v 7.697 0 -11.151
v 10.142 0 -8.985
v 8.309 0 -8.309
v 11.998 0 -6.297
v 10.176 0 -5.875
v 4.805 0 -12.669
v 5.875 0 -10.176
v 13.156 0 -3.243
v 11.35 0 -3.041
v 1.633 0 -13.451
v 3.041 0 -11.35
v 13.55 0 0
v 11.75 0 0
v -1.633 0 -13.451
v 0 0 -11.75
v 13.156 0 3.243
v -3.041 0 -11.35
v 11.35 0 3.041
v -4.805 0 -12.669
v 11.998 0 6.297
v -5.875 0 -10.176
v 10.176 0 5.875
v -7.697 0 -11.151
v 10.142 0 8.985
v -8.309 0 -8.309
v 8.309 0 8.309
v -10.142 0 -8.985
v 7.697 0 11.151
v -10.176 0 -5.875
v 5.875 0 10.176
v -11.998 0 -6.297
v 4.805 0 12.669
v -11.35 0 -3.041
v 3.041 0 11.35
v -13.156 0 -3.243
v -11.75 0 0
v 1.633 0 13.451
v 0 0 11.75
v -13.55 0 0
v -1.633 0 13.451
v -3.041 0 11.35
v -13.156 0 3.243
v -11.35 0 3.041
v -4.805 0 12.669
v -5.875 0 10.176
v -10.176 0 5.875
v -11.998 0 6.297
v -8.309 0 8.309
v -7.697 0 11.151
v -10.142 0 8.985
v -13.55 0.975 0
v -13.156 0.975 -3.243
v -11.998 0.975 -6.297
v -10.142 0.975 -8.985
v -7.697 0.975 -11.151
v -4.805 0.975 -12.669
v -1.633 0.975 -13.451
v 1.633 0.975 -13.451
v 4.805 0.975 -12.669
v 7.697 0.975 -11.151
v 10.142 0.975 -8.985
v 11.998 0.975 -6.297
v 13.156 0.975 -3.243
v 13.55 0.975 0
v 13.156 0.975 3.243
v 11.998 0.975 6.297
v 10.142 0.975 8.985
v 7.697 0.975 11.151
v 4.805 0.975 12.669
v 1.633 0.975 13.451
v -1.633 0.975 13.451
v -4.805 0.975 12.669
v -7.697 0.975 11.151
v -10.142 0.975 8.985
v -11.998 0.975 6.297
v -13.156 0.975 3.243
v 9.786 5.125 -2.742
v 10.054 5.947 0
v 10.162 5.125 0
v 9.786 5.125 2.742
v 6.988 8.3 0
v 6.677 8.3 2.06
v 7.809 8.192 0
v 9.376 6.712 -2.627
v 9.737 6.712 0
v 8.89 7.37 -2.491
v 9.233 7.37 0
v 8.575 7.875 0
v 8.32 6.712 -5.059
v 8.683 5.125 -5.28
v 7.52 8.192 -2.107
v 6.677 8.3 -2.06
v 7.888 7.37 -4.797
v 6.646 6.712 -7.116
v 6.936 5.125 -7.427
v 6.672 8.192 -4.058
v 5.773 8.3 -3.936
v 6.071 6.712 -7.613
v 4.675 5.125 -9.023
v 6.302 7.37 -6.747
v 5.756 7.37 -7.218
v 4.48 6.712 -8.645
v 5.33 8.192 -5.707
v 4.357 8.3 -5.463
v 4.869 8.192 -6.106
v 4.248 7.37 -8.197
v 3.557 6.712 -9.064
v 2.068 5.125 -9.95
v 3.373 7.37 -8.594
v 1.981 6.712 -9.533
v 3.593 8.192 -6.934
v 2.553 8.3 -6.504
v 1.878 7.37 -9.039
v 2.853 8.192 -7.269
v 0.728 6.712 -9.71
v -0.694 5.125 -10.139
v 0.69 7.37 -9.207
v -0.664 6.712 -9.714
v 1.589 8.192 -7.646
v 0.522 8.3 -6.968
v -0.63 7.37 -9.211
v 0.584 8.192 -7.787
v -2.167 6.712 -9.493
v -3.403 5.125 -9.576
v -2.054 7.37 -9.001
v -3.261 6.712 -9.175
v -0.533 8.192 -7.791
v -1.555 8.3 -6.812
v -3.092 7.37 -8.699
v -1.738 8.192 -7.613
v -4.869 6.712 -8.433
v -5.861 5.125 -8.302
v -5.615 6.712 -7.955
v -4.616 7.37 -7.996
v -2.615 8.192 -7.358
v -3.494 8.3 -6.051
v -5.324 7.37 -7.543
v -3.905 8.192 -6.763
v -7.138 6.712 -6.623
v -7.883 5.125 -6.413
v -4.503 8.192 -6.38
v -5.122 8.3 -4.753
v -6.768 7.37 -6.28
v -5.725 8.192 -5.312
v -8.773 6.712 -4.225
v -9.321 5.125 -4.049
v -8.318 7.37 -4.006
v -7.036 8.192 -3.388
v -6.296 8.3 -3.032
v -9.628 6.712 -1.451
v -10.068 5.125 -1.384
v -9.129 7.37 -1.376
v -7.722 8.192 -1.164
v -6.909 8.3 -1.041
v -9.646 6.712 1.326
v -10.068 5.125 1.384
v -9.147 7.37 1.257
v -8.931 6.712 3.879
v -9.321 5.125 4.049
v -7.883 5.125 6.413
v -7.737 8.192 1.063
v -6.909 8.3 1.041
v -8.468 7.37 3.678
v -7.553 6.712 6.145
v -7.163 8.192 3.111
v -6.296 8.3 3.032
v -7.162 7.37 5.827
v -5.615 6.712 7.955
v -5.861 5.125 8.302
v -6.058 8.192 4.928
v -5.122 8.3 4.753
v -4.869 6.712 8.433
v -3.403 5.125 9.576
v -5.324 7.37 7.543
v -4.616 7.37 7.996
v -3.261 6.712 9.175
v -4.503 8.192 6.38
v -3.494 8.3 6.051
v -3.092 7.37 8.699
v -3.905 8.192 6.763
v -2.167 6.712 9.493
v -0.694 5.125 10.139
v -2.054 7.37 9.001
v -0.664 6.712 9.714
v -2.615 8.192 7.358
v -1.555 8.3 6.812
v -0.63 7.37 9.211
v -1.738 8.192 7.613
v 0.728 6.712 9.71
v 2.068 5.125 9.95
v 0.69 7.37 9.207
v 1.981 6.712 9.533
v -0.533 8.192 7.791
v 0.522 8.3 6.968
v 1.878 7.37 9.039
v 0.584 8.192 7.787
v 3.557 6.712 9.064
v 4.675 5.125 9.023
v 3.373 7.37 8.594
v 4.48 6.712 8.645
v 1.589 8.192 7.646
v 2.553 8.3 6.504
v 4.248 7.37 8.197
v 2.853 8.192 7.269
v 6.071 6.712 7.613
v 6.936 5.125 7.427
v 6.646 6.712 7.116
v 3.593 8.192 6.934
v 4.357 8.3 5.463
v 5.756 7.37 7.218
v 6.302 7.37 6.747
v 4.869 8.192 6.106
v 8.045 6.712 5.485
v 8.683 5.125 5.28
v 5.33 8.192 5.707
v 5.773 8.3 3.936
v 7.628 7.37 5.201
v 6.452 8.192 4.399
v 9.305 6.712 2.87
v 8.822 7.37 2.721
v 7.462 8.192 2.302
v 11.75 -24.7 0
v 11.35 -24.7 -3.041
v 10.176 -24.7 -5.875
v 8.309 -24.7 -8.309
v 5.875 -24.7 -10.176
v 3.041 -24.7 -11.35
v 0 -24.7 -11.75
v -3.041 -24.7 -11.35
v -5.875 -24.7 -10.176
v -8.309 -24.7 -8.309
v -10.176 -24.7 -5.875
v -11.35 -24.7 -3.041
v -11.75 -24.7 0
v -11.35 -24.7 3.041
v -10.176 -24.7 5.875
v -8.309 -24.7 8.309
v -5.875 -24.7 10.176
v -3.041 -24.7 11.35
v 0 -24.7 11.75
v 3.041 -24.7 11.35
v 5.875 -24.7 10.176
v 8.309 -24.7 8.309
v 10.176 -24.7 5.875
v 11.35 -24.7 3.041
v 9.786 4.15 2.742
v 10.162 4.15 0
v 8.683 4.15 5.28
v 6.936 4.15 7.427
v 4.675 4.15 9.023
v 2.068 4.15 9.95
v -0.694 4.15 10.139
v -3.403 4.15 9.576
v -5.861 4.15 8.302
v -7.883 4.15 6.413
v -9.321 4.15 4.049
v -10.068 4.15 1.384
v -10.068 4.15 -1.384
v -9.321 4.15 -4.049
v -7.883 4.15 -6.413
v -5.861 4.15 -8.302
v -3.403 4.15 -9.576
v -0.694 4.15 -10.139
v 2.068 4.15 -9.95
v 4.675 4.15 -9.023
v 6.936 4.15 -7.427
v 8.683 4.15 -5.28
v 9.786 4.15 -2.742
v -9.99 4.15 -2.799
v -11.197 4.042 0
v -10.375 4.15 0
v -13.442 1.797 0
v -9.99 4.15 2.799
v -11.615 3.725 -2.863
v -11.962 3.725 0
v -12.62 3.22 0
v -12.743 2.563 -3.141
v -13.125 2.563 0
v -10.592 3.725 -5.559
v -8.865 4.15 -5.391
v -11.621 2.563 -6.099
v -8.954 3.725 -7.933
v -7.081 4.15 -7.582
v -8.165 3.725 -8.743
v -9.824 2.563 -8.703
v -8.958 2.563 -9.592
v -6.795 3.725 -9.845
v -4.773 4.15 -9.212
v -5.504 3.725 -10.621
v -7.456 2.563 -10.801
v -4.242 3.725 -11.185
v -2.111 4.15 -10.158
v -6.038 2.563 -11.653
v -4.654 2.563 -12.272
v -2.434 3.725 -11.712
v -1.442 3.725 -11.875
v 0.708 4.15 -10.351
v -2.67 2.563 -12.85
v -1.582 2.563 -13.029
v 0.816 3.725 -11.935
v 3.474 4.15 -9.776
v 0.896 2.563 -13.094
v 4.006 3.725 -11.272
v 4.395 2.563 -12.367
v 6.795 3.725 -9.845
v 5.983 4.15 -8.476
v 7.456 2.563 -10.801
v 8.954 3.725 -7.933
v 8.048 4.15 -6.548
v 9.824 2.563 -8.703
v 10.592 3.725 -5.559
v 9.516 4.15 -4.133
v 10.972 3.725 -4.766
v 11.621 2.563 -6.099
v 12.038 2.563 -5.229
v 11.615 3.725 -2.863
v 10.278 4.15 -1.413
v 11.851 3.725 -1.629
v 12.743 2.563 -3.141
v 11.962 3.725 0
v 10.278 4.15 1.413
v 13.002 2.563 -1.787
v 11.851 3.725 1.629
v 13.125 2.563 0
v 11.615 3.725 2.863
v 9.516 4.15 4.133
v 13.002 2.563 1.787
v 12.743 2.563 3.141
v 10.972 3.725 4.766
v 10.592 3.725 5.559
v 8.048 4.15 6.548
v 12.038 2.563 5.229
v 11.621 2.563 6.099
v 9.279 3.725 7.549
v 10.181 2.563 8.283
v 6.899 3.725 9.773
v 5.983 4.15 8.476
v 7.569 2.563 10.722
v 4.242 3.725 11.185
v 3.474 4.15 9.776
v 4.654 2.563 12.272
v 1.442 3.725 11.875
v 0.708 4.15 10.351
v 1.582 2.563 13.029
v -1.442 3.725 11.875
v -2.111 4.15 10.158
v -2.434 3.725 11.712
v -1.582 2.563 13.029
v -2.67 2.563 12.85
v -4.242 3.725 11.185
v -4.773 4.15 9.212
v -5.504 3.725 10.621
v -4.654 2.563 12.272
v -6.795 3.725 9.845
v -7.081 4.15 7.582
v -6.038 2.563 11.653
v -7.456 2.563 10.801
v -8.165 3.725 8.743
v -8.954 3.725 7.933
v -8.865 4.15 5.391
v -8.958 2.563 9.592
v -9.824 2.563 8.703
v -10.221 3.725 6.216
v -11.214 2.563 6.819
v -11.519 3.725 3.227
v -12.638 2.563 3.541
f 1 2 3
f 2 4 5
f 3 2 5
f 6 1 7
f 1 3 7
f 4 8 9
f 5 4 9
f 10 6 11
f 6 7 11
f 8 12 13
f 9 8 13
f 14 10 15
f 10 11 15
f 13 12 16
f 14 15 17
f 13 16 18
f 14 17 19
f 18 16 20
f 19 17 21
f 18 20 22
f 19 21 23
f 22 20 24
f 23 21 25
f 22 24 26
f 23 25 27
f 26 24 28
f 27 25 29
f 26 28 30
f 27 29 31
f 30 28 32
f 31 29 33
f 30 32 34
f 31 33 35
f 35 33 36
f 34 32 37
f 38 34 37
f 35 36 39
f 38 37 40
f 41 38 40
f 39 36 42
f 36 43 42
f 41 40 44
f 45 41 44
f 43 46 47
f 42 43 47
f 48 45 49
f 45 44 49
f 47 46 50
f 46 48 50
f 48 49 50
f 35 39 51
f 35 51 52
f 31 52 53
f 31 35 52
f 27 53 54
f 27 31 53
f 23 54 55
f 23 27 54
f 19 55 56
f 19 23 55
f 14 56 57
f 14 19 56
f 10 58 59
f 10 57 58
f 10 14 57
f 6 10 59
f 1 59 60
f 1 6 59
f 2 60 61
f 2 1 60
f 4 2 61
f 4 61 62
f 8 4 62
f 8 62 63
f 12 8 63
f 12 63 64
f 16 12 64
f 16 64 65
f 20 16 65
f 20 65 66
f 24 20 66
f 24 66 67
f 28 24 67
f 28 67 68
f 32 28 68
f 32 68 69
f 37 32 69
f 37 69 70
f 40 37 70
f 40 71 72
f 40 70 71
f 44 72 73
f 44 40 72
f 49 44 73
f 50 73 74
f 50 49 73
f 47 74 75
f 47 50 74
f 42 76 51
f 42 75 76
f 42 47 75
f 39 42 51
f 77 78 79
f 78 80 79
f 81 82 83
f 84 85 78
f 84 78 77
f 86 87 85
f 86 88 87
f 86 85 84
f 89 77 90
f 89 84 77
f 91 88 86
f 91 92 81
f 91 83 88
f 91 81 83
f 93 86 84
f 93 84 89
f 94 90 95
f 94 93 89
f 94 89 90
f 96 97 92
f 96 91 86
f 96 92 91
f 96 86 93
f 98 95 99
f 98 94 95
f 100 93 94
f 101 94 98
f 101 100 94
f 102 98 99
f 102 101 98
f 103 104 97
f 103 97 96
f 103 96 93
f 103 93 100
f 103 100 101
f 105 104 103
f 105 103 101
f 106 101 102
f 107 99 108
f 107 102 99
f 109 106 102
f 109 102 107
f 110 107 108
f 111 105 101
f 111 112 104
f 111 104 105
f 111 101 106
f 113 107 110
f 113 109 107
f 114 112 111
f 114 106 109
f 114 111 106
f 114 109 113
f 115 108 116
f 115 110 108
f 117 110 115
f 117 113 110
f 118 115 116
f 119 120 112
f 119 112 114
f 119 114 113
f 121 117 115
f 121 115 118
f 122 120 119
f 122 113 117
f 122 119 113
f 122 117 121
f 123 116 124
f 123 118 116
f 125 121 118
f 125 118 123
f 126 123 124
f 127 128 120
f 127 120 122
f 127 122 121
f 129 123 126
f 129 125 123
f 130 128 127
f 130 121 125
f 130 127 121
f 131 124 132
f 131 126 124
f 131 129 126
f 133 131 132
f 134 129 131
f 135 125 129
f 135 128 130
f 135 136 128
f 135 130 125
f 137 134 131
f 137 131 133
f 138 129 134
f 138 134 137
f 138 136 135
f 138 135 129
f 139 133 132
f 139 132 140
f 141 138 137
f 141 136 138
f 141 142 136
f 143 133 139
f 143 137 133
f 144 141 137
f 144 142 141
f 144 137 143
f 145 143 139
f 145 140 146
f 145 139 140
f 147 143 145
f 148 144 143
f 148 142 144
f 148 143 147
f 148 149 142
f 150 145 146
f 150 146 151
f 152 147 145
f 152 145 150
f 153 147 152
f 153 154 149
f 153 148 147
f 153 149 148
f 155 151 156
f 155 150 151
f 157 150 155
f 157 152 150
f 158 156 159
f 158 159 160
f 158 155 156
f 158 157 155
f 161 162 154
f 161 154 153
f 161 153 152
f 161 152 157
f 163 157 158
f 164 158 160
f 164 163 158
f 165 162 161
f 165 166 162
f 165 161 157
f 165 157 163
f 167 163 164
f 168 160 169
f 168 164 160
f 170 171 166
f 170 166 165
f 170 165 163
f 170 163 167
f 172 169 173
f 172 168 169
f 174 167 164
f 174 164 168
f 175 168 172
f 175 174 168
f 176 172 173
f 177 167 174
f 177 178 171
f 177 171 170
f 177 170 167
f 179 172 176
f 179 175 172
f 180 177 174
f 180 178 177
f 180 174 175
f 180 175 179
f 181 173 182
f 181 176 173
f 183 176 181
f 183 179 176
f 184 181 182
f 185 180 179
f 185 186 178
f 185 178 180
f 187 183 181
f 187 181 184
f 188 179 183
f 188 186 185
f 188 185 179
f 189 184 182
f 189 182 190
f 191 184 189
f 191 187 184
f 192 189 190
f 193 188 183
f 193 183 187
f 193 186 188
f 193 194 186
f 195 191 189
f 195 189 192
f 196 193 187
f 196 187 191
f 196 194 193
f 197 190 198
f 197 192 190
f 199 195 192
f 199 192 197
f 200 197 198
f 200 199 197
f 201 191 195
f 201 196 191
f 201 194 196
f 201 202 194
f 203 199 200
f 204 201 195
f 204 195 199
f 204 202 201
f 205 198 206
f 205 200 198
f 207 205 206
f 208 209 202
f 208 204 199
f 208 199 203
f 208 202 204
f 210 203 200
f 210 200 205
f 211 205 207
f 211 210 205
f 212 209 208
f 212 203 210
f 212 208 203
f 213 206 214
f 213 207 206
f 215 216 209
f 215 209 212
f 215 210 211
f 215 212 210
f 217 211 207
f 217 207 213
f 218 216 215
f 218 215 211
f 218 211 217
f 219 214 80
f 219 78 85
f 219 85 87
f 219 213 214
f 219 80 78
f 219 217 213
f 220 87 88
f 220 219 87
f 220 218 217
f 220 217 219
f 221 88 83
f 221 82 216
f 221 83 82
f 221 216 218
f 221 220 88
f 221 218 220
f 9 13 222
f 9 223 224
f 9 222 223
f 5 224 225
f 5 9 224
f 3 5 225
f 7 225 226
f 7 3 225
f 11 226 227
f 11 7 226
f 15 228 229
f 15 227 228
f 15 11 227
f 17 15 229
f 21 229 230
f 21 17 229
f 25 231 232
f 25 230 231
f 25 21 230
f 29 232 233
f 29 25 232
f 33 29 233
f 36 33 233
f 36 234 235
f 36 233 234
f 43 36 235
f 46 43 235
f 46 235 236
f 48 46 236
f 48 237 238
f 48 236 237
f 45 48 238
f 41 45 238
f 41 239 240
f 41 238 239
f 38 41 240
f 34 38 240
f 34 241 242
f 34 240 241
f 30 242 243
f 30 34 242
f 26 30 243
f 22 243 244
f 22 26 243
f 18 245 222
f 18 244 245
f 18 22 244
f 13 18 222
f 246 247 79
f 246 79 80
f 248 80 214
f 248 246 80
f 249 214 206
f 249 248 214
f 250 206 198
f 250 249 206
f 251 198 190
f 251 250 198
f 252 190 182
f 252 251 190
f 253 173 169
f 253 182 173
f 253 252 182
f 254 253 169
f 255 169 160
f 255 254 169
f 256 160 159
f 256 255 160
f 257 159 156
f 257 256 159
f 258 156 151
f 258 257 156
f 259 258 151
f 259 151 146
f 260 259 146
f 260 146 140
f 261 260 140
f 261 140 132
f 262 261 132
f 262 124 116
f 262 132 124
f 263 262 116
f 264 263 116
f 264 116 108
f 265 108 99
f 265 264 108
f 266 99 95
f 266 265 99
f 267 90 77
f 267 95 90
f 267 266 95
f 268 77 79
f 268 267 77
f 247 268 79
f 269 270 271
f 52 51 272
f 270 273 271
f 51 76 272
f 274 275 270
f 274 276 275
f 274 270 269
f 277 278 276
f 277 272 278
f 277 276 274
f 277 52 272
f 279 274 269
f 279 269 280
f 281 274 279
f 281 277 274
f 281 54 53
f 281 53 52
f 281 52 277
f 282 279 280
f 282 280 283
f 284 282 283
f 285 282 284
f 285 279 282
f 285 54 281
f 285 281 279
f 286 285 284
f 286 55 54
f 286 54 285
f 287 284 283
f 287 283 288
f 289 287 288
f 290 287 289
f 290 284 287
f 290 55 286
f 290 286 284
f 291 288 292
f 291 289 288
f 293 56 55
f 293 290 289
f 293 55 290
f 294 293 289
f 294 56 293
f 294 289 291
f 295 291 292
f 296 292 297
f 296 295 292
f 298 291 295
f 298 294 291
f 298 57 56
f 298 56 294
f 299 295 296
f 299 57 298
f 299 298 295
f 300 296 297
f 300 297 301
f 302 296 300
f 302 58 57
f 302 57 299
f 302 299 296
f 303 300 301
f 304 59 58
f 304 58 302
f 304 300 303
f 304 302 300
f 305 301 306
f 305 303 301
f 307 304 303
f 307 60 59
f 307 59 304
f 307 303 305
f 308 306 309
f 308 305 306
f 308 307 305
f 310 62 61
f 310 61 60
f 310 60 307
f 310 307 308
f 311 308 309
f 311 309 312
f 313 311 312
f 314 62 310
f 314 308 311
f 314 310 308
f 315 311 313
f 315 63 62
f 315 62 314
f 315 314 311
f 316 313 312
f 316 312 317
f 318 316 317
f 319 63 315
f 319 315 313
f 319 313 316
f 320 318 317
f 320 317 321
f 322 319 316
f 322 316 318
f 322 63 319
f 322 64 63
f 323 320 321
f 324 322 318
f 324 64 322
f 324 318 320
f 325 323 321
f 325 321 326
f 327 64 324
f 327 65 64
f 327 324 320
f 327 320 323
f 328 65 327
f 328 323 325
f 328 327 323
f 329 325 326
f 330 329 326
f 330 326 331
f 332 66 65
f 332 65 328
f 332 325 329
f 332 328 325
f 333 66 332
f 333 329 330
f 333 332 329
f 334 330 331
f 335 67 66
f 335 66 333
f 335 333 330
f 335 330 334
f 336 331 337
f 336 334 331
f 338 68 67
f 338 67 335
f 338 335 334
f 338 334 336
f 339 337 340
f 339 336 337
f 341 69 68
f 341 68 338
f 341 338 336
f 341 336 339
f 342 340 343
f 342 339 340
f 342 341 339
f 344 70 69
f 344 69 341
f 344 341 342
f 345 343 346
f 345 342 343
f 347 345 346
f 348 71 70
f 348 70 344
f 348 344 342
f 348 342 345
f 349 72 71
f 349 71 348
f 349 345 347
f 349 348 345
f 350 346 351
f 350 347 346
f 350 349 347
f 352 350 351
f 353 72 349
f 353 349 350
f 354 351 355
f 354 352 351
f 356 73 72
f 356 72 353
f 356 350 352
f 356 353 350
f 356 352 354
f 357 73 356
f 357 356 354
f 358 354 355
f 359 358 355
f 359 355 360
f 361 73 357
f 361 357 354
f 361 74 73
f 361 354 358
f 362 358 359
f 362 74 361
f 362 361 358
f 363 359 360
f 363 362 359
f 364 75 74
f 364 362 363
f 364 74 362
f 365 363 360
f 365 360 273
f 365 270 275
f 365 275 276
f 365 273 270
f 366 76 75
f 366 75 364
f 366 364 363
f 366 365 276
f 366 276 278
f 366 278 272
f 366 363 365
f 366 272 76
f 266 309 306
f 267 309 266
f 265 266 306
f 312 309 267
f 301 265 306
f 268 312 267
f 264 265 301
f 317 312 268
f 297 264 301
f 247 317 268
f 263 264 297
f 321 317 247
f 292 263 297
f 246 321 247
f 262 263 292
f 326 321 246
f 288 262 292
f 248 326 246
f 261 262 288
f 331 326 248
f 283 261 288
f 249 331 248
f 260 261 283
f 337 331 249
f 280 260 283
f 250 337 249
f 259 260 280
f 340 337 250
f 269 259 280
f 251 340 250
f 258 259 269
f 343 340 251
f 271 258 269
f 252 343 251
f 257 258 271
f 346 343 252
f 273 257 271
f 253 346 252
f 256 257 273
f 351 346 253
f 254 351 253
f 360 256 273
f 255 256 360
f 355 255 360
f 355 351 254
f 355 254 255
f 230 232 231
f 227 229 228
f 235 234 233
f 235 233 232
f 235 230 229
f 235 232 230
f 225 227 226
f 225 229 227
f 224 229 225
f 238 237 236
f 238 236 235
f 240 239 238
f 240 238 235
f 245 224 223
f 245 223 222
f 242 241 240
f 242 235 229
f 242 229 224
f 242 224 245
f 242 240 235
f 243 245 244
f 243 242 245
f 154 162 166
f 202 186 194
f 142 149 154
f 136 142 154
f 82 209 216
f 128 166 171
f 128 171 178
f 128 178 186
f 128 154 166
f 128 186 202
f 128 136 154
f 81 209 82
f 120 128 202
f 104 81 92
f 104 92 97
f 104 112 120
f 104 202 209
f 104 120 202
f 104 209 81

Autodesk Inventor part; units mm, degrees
ref_plane "YZ Plane" through (0, 0, 0) normal (1, 0, 0) x (0, 1, 0)
ref_plane "XZ Plane" through (0, 0, 0) normal (0, 1, 0) x (-1, 0, 0)
ref_plane "XY Plane" through (0, 0, 0) normal (0, 0, 1) x (1, 0, 0)
sketch "Sketch1" plane through (0, 0, 0) normal (0, 1, 0) x (-1, 0, 0)
  circle A0 centre (0, 0) radius 13.55
  dimension "d0" = 27.1
extrude "Extrusion1" add sketch "Sketch1" along normal blind 4.15
sketch "Sketch2" plane through (0, 4.15, 0) normal (0, 1, 0) x (1, 0, 0)
  circle A0 centre (0, 0) radius 10.1625
  dimension "d3" = 20.325
extrude "Extrusion2" add sketch "Sketch2" along normal blind 4.15
fillet "Fillet1" radius 3.175 1 edges at (-10.1625, 8.3, 0)
fillet "Fillet2" radius 3.175 1 edges at (13.55, 4.15, 0)
sketch "Sketch3" plane through (0, 0, 0) normal (0, -1, 0) x (1, 0, 0)
  circle A0 centre (0, 0) radius 11.75
  dimension "d8" = 23.5
extrude "Extrusion3" add sketch "Sketch3" along normal blind 24.7
properties part number "small_button"
